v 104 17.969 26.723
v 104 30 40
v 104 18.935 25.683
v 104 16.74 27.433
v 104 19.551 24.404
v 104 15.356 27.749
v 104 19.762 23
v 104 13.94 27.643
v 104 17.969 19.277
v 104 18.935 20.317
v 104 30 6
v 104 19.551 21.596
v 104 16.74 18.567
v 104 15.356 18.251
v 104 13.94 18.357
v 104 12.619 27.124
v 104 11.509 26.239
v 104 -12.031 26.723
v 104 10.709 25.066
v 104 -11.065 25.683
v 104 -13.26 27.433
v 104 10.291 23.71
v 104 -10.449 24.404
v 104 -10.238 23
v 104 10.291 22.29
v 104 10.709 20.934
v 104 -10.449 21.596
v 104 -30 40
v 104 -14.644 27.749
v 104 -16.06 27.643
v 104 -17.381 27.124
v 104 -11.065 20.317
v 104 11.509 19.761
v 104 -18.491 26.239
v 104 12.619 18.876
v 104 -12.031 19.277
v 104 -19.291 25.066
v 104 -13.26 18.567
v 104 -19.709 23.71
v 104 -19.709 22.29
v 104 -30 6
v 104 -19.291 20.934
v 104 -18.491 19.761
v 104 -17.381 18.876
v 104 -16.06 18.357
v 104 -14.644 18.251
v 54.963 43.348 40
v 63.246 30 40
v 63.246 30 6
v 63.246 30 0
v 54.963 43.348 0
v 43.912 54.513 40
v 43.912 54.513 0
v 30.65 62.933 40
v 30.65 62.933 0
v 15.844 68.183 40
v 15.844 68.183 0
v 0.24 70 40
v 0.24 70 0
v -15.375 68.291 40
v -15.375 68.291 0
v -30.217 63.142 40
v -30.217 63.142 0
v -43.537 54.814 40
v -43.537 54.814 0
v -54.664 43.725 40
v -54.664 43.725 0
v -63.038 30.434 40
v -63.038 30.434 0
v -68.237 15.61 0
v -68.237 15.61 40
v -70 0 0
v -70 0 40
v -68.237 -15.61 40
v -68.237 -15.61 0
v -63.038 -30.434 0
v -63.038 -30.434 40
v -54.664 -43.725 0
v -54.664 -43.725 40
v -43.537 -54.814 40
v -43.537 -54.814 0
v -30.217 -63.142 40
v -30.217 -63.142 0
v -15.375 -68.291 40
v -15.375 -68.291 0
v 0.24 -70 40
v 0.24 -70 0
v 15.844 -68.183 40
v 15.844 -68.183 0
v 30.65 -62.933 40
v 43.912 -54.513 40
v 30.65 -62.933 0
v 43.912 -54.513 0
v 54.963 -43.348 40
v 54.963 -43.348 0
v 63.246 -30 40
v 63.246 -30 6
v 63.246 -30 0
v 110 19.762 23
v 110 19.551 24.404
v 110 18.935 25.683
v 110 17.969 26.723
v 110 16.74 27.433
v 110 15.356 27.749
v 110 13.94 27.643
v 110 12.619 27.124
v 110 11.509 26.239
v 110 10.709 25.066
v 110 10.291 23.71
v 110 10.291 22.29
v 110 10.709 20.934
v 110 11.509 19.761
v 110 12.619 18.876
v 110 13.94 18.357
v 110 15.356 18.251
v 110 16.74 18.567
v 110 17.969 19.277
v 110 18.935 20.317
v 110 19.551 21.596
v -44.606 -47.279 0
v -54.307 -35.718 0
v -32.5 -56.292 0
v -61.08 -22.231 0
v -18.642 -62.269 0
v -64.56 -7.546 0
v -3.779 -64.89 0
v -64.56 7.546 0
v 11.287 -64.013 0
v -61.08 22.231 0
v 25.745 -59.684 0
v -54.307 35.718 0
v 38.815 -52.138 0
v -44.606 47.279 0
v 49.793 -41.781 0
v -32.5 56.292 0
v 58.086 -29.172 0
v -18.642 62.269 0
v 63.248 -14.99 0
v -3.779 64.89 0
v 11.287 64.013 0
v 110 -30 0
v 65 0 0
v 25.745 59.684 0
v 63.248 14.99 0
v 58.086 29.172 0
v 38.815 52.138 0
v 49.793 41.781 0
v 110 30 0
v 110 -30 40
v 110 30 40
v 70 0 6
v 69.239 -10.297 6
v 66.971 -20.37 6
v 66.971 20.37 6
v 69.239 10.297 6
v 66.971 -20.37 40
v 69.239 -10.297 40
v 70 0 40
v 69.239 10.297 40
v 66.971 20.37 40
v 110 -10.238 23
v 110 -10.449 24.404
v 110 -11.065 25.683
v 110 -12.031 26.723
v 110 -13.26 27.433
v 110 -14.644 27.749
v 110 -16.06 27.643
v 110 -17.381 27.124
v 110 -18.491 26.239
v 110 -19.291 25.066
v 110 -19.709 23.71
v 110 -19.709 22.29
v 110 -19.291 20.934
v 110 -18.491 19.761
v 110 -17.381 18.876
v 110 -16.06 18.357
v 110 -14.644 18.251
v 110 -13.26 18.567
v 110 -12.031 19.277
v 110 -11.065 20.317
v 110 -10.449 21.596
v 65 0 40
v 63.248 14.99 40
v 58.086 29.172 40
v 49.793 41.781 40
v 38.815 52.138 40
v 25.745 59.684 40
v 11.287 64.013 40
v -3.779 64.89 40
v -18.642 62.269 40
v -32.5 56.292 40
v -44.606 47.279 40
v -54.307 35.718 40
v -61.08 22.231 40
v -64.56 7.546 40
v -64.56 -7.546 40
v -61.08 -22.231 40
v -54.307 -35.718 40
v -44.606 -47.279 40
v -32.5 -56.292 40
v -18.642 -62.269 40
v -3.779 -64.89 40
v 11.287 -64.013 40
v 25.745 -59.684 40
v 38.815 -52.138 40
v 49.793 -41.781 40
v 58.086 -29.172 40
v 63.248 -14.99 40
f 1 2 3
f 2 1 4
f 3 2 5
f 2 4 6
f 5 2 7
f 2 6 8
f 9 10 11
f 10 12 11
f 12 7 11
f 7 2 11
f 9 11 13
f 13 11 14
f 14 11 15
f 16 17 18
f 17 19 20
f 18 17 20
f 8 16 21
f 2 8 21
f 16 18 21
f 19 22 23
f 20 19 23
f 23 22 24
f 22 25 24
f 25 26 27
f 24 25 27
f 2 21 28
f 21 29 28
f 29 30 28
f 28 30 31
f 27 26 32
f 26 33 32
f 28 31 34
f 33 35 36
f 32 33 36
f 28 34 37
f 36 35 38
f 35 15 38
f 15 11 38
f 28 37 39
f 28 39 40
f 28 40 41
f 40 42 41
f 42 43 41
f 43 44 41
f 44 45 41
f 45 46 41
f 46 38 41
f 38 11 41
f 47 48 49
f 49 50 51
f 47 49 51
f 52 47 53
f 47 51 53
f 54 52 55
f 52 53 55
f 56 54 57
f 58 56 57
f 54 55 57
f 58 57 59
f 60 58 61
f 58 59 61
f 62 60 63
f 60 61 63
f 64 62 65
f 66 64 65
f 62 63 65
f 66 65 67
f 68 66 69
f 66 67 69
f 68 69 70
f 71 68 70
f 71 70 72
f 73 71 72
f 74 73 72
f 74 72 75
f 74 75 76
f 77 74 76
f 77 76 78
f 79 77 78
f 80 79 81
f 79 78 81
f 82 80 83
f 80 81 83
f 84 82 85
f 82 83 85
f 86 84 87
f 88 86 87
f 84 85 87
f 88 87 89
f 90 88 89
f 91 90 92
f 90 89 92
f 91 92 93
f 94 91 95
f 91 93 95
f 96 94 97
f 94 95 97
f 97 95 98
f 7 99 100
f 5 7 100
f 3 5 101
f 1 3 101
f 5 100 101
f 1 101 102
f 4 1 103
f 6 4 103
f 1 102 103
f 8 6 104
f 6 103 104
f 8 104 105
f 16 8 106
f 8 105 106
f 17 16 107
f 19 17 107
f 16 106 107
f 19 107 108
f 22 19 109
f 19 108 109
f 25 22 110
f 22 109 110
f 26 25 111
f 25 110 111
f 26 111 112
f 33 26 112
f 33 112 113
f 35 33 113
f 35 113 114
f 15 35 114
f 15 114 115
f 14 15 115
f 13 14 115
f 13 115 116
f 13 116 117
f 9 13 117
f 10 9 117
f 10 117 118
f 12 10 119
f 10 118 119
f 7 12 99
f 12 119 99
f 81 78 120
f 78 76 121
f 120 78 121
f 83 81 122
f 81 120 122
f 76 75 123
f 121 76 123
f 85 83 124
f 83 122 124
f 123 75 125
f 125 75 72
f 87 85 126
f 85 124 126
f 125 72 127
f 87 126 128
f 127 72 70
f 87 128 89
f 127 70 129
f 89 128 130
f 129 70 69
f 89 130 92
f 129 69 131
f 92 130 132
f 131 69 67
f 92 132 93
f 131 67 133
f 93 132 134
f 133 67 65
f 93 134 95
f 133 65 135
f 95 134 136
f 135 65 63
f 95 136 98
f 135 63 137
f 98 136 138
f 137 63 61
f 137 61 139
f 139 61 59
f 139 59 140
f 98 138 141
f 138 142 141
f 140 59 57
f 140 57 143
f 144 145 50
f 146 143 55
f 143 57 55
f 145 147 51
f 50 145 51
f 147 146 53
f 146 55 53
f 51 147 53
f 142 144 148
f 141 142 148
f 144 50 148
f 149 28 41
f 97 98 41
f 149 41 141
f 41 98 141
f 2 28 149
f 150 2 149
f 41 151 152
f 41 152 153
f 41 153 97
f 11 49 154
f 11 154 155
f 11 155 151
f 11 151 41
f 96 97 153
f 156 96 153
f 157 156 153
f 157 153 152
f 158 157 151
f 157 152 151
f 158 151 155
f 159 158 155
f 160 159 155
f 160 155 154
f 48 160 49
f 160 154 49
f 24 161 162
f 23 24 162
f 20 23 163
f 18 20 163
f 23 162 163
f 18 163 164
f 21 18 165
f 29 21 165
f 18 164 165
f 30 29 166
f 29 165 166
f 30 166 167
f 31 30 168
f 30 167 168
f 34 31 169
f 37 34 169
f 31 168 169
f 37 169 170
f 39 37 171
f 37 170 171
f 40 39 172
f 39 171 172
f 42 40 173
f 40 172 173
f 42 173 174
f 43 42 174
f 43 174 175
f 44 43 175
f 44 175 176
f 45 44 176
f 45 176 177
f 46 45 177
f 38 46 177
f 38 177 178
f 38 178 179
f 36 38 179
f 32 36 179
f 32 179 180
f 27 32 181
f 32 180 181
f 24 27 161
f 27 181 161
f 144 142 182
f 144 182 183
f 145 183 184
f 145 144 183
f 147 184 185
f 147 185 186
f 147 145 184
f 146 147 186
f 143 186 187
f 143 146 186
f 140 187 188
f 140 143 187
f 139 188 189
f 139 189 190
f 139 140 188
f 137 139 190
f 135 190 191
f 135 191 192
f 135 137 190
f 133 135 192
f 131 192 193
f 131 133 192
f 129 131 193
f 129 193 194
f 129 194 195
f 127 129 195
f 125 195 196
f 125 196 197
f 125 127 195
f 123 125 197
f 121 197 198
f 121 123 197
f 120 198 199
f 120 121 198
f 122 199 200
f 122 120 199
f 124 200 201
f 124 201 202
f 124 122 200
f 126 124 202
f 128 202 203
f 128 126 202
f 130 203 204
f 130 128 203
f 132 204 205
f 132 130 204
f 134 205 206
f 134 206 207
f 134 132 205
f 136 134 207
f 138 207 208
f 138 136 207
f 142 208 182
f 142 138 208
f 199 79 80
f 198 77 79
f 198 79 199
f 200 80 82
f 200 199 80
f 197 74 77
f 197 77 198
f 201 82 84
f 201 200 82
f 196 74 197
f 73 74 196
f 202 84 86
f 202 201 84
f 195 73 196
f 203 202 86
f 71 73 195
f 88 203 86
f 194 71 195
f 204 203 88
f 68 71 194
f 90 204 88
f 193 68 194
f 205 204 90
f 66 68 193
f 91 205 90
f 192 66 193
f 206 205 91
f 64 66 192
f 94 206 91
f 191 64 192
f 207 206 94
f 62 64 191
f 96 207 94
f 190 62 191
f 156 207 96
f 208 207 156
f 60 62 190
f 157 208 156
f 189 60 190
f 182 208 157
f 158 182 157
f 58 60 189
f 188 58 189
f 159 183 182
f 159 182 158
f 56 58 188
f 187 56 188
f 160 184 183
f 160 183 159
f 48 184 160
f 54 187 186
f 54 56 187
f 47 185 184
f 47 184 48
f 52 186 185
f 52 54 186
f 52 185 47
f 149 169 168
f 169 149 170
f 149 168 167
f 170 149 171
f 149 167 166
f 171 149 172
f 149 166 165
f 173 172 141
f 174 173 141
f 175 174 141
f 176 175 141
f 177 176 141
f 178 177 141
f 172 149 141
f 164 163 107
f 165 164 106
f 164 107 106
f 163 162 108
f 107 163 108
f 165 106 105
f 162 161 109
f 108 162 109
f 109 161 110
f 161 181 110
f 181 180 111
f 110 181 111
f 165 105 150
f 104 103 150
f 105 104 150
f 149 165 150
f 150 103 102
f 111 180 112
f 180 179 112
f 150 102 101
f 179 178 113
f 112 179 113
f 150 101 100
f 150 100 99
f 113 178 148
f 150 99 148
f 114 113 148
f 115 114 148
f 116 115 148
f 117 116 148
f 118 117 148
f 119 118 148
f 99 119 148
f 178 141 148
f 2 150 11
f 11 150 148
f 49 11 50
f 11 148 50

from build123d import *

# Parameters (mm, degrees)
F0_R     = 65
F1_DEPTH = 40
F2_DEPTH = 6
F3_DEPTH = 40
F4_R     = 4.7625
F5_DEPTH = 6


with BuildPart() as f1:
    # F0 (on Top) → F1 (new body)
    with BuildSketch(Plane.XY):
        with BuildLine():
            ThreePointArc((63.245553, -30), (68.290514, -15.375488), (70, 0))
            ThreePointArc((70, 0), (68.290514, 15.375488), (63.245553, 30))
            ThreePointArc((63.245553, 30), (-70, 0), (63.245553, -30))
        make_face()
        Circle(F0_R, mode=Mode.SUBTRACT)
    extrude(amount=F1_DEPTH)

    # F0 (on Top) → F2 (join)
    with BuildSketch(Plane.XY):
        with BuildLine():
            ThreePointArc((63.245553, 30), (68.290514, 15.375488), (70, 0))
            ThreePointArc((70, 0), (68.290514, -15.375488), (63.245553, -30))
            Line((63.245553, -30), (104, -30))
            Line((104, -30), (104, 30))
            Line((104, 30), (63.245553, 30))
        make_face()
    extrude(amount=F2_DEPTH)

    # F0 (on Top) → F3 (join)
    with BuildSketch(Plane.XY):
        Polygon((110, 30), (104, 30), (104, -30), (110, -30), (110, 0), align=None)
    extrude(amount=F3_DEPTH)

    # F4 (on face) → F5 (cut)
    with BuildSketch(Plane.YZ.offset(110)):
        with Locations((-15, 23)):
            Circle(F4_R)
        with Locations((15, 23)):
            Circle(F4_R)
    extrude(amount=-F5_DEPTH, mode=Mode.SUBTRACT)


solid = f1.part
